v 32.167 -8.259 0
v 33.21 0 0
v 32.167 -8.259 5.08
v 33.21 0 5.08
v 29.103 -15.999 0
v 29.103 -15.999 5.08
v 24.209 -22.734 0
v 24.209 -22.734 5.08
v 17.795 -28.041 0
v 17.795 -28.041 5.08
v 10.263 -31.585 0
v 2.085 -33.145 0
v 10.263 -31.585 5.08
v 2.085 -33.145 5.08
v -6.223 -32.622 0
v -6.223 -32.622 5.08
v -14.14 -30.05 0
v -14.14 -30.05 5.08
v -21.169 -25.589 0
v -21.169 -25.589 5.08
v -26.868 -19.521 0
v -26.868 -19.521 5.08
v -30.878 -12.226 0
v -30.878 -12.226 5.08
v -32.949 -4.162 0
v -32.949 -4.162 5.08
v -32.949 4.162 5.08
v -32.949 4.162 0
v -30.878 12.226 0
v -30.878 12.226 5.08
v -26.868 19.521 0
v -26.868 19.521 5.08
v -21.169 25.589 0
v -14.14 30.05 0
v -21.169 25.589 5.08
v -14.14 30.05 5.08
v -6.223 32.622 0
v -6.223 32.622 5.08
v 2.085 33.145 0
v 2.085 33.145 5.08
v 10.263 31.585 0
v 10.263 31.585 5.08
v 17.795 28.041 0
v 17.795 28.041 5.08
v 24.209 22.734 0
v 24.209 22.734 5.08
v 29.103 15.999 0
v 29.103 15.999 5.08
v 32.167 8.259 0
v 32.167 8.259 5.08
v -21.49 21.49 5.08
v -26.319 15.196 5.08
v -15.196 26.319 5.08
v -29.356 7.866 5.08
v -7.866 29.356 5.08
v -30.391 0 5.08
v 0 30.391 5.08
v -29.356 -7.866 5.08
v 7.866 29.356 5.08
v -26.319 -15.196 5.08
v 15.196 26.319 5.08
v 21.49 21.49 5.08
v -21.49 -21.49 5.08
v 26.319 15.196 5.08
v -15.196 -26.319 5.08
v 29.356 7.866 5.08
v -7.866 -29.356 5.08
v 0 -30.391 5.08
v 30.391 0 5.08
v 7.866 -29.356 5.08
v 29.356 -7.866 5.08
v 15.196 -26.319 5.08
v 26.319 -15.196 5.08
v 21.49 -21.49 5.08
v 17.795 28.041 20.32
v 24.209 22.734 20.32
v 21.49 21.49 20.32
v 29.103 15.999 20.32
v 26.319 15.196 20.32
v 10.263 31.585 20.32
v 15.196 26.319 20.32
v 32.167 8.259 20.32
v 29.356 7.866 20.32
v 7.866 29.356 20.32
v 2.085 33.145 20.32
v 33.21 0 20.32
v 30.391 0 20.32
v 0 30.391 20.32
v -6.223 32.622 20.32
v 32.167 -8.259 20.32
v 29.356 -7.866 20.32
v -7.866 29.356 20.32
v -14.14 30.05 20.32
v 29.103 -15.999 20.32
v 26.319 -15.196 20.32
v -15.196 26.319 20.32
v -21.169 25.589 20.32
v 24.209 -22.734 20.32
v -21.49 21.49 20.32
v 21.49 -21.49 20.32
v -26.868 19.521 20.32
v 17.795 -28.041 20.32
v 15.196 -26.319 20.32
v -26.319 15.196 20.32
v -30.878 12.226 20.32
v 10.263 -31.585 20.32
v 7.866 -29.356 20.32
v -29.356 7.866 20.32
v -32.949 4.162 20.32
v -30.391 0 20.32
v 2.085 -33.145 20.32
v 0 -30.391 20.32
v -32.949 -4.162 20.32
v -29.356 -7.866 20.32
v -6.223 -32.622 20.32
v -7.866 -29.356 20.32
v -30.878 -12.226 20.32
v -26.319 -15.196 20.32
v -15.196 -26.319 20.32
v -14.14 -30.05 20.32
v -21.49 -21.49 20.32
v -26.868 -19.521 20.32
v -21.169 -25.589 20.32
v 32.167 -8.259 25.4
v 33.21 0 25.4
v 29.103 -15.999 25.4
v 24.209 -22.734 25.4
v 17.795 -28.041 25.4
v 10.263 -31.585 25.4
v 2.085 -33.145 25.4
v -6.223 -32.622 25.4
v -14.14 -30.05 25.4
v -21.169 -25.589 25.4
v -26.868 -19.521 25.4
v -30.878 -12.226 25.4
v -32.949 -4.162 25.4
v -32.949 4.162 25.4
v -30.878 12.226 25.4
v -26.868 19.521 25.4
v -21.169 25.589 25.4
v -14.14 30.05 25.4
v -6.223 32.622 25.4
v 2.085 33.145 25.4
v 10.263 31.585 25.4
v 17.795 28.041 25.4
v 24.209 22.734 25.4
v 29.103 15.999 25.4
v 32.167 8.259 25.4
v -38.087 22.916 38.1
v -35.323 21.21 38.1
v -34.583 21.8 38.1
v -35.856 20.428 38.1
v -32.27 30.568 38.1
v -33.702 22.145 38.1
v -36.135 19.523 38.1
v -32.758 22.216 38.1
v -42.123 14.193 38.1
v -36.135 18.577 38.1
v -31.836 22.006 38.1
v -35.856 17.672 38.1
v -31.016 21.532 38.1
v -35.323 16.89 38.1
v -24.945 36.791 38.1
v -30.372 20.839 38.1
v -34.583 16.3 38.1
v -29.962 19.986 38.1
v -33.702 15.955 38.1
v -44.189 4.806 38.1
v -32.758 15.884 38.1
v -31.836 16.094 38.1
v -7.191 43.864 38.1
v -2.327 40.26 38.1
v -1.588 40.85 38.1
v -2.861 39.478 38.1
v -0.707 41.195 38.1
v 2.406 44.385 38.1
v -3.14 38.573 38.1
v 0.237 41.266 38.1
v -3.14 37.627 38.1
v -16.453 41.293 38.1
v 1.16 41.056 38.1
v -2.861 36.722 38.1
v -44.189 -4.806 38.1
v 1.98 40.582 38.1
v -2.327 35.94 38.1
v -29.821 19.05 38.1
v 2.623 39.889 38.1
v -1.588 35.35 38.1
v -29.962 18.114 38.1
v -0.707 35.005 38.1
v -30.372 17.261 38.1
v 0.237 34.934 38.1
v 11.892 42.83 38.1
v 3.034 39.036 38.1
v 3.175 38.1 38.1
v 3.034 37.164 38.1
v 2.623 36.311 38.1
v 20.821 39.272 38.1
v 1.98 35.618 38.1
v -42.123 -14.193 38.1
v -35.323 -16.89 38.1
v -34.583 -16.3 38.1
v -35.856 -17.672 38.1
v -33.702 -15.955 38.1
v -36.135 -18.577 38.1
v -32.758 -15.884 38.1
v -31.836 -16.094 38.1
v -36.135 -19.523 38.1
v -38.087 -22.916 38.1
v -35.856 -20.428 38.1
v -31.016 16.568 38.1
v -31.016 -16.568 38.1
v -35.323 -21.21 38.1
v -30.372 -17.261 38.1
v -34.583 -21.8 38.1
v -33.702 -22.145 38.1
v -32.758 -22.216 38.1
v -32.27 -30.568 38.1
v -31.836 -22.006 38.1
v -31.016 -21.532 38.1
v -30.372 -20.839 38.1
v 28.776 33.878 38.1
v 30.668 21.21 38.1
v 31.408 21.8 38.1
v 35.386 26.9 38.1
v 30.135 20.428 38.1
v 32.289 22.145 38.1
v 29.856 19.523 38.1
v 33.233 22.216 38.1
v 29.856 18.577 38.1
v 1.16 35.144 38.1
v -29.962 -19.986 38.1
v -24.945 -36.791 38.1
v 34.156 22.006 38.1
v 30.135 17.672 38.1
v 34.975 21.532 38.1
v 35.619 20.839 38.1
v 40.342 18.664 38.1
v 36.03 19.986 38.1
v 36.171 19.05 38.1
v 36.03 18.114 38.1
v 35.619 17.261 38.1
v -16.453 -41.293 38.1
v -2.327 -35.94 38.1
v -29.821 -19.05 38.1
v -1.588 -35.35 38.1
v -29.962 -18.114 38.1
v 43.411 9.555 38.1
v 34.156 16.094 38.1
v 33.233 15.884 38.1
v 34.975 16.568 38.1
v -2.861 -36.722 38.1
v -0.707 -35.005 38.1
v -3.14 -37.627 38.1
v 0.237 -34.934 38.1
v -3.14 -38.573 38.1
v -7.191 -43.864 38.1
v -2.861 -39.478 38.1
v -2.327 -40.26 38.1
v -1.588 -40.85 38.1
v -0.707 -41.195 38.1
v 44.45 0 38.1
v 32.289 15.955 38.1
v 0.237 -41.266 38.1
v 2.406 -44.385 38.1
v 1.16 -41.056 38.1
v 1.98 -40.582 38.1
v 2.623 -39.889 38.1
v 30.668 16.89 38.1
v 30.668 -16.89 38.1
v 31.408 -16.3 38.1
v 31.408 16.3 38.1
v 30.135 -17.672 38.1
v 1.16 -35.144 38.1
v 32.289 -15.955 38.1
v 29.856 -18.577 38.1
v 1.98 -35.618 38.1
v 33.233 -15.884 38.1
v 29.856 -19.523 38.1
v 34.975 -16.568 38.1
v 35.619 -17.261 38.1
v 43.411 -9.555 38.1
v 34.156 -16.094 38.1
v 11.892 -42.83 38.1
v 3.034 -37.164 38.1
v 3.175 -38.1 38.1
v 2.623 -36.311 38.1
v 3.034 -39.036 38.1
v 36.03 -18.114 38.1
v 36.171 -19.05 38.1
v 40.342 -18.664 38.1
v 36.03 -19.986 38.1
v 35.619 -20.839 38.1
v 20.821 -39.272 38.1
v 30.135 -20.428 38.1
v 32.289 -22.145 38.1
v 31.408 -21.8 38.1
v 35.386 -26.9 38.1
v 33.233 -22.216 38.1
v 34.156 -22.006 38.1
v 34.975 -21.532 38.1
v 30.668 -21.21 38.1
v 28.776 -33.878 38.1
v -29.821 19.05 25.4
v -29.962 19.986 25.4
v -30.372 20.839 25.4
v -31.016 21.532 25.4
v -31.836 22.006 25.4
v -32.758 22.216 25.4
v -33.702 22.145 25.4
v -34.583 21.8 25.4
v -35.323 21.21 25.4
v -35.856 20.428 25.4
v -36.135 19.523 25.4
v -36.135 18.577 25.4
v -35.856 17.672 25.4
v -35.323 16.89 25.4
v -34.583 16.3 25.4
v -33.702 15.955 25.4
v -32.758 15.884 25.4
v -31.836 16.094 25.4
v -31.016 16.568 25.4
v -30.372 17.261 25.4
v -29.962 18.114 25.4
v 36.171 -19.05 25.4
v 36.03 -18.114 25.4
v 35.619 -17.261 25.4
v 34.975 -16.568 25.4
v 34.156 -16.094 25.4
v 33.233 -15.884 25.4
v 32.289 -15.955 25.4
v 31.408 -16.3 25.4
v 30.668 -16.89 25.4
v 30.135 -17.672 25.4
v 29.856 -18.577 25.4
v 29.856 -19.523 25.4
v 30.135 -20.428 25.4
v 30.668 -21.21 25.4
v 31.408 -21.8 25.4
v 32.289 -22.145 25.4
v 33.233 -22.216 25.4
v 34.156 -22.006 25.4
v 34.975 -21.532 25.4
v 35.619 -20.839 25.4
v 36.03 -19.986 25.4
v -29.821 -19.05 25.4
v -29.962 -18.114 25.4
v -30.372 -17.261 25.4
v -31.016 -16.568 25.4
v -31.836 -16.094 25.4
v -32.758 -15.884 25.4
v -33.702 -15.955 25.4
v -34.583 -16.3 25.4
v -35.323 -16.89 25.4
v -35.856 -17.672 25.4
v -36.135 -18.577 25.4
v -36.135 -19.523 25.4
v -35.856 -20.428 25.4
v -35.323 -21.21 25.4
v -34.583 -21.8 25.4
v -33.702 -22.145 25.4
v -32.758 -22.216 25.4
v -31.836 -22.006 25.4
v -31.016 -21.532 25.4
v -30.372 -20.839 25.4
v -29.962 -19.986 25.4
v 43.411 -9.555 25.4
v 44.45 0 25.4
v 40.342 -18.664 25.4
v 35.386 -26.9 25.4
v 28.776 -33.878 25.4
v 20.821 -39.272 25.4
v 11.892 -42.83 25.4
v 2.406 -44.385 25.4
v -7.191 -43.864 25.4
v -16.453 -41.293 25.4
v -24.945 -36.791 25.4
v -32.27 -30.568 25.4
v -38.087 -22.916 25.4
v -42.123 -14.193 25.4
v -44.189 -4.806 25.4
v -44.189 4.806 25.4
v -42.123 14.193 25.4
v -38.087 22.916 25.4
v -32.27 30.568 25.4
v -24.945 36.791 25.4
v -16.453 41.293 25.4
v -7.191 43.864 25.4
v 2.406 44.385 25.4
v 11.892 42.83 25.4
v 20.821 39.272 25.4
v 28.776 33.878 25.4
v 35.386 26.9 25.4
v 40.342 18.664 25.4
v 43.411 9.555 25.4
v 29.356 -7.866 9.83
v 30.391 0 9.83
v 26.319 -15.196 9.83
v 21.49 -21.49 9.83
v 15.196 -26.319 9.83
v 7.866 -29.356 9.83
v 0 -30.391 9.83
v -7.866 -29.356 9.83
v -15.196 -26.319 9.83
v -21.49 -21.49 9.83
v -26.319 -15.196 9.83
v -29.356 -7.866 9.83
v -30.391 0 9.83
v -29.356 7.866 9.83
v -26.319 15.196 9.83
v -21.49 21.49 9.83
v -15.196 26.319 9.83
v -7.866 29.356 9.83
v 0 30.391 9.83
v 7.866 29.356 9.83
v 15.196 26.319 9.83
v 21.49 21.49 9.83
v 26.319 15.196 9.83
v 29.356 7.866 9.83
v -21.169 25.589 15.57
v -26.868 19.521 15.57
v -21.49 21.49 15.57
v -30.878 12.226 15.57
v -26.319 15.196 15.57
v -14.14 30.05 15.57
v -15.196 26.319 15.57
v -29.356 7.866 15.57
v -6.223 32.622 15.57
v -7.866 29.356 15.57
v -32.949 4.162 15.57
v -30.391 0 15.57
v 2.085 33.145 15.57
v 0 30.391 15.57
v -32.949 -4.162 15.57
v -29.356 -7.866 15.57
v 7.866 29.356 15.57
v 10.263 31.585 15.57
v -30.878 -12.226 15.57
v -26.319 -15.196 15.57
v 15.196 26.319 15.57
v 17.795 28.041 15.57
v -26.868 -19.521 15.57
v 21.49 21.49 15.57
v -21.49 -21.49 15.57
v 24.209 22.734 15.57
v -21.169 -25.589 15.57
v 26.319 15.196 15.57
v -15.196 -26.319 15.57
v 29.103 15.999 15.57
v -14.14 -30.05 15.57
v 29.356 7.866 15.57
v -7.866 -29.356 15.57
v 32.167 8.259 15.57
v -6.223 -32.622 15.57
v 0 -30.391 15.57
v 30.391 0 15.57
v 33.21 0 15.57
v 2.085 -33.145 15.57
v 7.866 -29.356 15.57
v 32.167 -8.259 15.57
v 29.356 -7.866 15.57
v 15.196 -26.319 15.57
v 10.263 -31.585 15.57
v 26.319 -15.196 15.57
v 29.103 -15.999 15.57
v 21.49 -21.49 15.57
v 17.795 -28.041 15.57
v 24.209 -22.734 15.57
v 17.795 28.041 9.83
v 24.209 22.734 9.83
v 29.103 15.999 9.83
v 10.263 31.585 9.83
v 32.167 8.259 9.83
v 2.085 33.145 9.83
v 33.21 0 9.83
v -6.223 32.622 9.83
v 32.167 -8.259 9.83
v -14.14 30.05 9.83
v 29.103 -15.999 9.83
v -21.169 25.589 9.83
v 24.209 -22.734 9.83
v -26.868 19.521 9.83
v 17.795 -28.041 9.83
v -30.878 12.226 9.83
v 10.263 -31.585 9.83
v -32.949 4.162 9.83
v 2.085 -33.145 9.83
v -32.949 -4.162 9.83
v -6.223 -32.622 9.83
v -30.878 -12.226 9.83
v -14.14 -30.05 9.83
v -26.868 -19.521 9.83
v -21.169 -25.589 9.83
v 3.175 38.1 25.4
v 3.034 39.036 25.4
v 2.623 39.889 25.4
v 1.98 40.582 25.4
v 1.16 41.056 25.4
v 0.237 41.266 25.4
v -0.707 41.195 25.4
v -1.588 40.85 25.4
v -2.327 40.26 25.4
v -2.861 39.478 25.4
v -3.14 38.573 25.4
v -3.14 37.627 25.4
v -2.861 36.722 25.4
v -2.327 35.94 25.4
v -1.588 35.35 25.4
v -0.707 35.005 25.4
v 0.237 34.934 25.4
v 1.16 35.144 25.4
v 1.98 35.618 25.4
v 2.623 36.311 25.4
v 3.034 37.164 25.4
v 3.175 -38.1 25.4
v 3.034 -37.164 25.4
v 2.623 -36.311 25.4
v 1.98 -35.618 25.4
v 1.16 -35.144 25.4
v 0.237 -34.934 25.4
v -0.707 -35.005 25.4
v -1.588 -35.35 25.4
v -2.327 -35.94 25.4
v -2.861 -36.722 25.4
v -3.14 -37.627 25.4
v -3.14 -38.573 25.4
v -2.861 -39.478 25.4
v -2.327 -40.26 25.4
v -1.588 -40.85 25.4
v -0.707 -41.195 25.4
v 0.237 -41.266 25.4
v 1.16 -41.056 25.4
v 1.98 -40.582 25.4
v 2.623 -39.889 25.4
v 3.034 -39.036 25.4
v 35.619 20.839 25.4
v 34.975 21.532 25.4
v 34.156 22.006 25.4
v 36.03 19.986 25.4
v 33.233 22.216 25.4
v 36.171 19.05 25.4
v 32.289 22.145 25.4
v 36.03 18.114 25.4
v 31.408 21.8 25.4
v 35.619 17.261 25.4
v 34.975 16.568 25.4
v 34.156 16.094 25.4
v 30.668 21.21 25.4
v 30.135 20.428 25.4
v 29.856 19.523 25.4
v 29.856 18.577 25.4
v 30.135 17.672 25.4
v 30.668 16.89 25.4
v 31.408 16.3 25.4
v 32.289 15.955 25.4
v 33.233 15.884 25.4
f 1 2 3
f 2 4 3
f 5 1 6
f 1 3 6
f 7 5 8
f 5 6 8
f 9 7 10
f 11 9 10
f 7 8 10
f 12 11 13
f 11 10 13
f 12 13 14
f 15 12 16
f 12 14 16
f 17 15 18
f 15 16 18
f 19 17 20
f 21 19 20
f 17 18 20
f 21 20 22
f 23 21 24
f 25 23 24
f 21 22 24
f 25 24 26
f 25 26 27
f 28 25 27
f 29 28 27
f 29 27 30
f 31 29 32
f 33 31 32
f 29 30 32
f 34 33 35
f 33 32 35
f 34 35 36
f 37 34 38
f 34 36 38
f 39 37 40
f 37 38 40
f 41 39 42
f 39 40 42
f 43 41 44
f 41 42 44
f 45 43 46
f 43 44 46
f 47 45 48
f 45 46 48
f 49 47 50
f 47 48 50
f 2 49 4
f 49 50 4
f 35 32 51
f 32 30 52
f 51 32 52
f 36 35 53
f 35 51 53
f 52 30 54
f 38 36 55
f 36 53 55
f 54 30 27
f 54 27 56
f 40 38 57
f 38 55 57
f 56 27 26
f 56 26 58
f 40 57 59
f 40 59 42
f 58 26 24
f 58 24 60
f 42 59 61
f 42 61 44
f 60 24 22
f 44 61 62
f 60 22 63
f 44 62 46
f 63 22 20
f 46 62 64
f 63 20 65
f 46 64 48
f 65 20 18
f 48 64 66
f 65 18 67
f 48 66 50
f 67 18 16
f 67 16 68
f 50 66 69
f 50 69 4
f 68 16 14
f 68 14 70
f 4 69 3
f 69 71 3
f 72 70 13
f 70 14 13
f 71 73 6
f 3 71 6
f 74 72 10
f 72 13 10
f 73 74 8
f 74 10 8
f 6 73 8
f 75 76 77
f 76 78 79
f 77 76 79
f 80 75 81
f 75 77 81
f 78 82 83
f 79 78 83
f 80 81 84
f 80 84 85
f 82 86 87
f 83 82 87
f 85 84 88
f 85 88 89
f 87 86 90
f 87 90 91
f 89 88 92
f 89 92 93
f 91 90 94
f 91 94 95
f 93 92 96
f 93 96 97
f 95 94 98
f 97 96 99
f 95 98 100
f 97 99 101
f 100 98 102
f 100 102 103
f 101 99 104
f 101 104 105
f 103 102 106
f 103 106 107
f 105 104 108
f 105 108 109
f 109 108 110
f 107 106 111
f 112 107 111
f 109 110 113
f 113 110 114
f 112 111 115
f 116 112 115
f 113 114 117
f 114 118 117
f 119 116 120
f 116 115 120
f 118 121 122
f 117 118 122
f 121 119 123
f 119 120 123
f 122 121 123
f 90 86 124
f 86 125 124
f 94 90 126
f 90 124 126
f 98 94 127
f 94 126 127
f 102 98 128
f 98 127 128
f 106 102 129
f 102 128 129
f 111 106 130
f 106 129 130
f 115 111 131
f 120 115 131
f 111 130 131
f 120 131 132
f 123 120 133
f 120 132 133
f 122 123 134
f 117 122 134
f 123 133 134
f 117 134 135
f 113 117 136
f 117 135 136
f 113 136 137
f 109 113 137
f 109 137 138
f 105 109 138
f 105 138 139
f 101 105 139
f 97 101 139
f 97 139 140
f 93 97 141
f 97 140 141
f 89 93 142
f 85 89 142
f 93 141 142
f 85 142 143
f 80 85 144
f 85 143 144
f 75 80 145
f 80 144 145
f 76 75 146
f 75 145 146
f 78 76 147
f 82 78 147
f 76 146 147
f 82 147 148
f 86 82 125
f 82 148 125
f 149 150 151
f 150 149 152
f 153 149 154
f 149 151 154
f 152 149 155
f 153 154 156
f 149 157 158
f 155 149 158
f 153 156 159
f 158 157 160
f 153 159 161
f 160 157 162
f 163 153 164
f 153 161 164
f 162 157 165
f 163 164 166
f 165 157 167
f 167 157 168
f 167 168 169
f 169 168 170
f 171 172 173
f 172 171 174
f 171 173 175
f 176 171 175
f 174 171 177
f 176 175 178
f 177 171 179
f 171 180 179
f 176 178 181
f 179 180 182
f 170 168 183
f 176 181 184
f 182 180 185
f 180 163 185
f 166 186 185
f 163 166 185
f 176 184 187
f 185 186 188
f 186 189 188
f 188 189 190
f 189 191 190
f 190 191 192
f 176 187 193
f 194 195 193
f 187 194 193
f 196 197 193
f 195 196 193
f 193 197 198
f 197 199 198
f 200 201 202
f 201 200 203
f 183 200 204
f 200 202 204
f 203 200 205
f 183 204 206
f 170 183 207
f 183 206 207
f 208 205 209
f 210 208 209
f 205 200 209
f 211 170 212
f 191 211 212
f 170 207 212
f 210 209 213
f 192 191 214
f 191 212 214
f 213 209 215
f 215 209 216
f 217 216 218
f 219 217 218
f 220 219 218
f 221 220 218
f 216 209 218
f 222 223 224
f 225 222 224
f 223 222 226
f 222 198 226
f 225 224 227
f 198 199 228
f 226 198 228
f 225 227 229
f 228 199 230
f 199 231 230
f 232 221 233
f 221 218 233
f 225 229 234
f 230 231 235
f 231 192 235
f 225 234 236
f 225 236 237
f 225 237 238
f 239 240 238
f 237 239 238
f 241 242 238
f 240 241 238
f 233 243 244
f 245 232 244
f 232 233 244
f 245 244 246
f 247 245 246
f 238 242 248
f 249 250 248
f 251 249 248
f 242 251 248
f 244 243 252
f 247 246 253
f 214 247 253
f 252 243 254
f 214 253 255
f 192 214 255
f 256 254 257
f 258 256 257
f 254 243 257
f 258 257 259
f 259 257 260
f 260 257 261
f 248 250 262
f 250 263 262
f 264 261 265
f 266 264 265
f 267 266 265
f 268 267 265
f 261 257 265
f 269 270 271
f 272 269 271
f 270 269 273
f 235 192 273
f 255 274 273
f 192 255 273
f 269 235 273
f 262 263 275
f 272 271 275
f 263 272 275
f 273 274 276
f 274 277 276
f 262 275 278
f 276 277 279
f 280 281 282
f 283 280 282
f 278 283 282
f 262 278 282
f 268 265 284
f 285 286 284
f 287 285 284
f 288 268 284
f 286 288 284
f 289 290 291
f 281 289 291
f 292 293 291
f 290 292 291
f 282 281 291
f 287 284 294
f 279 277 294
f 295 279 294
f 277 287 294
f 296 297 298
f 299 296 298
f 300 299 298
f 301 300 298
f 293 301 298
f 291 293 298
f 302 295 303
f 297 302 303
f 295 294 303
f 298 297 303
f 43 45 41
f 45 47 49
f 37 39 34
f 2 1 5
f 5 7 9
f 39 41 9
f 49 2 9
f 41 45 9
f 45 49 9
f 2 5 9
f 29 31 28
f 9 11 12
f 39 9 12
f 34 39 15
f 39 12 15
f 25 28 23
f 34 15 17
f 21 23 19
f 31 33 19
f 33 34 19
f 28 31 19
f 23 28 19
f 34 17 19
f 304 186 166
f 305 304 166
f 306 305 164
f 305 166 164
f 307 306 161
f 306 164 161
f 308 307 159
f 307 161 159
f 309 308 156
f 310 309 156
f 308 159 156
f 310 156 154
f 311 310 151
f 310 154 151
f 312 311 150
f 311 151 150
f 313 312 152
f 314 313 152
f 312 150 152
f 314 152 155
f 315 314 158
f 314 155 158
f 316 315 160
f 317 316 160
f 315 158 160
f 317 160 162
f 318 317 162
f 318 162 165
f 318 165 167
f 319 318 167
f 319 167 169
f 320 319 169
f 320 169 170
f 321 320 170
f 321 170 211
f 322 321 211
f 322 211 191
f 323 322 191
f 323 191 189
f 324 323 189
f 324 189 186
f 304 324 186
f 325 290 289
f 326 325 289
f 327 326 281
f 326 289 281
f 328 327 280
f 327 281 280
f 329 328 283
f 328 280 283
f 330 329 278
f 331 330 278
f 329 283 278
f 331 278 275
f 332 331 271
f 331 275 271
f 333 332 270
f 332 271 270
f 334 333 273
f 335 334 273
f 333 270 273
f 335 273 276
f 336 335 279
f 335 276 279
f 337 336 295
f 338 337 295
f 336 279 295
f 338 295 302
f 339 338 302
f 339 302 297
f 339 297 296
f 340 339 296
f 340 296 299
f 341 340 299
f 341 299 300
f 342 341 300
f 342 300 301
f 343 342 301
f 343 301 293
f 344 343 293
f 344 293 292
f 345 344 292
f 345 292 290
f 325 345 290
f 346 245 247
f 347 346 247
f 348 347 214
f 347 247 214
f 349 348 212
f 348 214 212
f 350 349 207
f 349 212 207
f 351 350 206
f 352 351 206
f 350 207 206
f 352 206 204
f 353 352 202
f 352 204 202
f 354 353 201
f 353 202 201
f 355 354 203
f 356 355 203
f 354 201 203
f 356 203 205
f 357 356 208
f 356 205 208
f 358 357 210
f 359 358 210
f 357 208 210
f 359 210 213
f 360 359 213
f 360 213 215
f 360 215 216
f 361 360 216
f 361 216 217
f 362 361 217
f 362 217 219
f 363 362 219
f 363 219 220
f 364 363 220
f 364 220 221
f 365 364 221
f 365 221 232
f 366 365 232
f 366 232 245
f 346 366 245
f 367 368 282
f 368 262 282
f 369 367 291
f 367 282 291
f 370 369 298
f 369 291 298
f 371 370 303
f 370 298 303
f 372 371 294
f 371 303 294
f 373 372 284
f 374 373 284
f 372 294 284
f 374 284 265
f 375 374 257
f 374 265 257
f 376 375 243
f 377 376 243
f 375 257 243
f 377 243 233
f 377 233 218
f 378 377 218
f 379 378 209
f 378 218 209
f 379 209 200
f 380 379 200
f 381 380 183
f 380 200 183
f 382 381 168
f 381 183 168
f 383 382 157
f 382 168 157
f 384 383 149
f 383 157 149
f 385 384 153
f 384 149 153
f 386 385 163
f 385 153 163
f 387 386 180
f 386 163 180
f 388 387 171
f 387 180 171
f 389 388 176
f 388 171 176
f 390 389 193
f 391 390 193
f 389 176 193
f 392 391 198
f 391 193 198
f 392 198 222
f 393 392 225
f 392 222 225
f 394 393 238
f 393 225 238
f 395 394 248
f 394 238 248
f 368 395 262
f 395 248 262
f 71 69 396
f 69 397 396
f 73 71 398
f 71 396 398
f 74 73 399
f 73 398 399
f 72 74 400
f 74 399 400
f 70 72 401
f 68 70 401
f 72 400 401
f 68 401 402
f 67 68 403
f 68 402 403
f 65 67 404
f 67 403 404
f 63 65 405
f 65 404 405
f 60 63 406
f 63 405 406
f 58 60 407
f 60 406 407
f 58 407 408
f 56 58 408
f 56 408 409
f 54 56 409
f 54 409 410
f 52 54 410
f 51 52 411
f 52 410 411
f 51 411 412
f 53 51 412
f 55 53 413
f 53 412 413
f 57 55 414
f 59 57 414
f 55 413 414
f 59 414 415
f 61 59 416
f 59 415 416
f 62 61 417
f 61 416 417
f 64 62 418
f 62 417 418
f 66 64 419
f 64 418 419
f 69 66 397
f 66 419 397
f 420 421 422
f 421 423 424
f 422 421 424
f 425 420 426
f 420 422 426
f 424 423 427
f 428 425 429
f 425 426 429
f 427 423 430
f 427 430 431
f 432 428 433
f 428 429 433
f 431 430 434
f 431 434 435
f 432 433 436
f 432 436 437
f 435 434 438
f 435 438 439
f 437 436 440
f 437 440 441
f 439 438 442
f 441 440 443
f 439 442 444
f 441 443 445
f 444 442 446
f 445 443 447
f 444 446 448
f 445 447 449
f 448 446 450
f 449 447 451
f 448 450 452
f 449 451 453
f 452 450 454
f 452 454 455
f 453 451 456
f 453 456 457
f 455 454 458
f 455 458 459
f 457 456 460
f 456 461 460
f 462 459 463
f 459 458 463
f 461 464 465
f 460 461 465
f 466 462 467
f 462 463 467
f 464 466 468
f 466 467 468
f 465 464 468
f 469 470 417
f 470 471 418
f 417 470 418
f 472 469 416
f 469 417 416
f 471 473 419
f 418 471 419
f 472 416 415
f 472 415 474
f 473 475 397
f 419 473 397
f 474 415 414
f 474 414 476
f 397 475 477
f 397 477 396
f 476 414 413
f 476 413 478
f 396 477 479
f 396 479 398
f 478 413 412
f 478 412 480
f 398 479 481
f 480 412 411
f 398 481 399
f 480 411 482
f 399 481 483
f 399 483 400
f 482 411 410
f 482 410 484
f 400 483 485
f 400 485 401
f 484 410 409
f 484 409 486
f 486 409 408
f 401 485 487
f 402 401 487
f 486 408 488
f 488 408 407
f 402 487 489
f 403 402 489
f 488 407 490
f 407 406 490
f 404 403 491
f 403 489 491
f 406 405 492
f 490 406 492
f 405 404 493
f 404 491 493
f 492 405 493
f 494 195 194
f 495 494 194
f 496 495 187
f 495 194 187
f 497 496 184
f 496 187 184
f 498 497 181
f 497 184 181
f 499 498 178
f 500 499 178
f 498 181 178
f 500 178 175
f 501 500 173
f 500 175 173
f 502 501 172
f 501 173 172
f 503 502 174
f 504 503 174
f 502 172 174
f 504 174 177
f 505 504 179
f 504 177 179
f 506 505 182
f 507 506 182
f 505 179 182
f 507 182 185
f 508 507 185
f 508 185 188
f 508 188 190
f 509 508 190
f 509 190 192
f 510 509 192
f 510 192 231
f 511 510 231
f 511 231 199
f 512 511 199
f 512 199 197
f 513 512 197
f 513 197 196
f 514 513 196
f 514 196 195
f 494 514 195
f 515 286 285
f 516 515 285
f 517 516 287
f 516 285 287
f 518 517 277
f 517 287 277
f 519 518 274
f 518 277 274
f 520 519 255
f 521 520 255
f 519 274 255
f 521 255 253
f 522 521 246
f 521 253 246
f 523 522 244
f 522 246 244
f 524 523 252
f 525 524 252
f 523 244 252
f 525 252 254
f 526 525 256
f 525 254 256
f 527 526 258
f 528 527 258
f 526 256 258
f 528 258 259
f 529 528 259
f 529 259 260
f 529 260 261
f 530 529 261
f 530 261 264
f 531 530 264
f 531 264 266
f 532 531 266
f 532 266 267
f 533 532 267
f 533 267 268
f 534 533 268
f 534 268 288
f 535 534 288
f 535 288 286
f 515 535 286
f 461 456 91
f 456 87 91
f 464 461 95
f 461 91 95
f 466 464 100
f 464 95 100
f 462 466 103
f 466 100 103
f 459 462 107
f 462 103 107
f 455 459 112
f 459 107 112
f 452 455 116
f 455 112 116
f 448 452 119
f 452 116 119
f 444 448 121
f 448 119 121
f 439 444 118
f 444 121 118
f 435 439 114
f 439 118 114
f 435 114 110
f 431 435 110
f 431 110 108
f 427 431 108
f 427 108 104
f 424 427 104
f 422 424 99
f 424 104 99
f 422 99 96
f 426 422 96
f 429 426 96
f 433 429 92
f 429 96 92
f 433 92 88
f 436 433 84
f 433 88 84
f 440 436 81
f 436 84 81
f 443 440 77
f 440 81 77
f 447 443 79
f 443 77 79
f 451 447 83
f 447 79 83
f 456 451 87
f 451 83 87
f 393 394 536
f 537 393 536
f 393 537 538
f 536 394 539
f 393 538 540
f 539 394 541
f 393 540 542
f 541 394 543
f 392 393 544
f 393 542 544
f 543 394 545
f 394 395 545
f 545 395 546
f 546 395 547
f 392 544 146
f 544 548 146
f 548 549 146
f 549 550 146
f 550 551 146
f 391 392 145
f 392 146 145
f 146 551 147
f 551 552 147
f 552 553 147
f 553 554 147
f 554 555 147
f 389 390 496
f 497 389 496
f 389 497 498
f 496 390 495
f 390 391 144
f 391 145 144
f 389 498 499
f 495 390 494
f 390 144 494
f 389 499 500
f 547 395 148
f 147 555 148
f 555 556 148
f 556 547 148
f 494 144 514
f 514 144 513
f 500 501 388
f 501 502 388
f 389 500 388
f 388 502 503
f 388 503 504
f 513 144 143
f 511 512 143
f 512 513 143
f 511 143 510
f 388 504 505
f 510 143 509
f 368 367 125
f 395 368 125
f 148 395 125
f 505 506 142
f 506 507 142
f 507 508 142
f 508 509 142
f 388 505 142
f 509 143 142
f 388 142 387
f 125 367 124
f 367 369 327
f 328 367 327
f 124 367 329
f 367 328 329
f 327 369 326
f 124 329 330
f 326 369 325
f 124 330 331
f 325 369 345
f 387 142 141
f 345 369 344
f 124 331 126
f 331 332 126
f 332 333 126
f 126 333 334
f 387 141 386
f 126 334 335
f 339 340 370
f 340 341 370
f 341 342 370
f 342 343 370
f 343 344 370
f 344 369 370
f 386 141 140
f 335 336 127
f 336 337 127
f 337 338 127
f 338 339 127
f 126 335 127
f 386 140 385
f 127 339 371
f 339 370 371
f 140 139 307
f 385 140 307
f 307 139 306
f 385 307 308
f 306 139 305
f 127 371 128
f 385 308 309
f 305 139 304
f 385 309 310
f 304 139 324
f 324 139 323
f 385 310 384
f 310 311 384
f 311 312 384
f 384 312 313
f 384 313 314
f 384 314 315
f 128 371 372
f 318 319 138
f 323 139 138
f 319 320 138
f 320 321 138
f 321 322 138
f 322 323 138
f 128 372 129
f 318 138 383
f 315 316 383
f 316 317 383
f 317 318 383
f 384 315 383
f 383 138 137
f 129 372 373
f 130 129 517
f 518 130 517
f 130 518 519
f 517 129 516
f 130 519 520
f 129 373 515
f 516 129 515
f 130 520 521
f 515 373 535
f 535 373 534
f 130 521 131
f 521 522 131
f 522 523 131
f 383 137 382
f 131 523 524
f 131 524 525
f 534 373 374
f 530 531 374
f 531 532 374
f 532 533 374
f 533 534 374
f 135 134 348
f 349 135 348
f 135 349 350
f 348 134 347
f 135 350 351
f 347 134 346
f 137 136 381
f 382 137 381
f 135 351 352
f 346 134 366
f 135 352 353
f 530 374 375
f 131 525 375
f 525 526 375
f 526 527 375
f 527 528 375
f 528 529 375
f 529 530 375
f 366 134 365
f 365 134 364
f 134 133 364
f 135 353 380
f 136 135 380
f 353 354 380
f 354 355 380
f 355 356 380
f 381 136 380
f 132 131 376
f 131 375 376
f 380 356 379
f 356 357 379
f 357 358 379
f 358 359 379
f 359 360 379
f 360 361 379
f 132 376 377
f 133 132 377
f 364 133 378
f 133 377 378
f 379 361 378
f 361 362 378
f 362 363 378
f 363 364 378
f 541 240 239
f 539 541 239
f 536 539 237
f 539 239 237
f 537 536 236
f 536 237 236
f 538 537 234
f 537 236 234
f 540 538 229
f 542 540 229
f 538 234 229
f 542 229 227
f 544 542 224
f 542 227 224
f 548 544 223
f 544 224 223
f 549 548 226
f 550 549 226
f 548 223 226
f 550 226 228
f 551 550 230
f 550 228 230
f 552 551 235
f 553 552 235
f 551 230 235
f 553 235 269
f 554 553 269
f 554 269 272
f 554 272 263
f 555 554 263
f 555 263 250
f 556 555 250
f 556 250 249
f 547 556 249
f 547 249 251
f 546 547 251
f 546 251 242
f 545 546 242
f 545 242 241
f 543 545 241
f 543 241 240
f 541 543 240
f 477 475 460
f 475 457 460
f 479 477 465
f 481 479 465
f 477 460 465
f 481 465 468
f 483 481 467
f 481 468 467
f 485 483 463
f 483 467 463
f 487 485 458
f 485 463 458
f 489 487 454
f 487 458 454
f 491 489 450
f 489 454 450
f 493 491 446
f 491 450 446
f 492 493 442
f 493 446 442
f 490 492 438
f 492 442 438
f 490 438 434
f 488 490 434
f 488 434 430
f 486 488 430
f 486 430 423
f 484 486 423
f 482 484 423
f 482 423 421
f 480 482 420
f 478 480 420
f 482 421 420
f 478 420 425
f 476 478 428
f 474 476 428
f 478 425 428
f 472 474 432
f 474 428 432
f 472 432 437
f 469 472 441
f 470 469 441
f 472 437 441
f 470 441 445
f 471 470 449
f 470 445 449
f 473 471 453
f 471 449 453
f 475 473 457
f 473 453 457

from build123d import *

# Parameters (mm, degrees)
F3_R     = 3.175
F4_DEPTH = 25.4


with BuildPart() as f2:
    # F0 (on Front) → F2 (revolve)
    with BuildSketch(Plane.XZ):
        Polygon((44.45, 38.1), (0, 38.1), (0, 0), (33.2105, 0), (33.2105, 5.08), (30.3911, 5.08), (30.3911, 9.8298), (33.2105, 9.8298), (33.2105, 15.5702), (30.3911, 15.5702), (30.3911, 20.32), (33.2105, 20.32), (33.2105, 25.4), (44.45, 25.4), align=None)
    revolve(axis=Axis((0, 0, 36.677974), (0, 0, -1)))

    # F3 (on face) → F4 (cut)
    with BuildSketch(Plane.XY.offset(38.1)):
        with Locations((0, -38.1)):
            Circle(F3_R)
        with Locations((32.995568, -19.05)):
            Circle(F3_R)
        with Locations((32.995568, 19.05)):
            Circle(F3_R)
        with Locations((0, 38.1)):
            Circle(F3_R)
        with Locations((-32.995568, 19.05)):
            Circle(F3_R)
        with Locations((-32.995568, -19.05)):
            Circle(F3_R)
    extrude(amount=-F4_DEPTH, mode=Mode.SUBTRACT)


solid = f2.part
